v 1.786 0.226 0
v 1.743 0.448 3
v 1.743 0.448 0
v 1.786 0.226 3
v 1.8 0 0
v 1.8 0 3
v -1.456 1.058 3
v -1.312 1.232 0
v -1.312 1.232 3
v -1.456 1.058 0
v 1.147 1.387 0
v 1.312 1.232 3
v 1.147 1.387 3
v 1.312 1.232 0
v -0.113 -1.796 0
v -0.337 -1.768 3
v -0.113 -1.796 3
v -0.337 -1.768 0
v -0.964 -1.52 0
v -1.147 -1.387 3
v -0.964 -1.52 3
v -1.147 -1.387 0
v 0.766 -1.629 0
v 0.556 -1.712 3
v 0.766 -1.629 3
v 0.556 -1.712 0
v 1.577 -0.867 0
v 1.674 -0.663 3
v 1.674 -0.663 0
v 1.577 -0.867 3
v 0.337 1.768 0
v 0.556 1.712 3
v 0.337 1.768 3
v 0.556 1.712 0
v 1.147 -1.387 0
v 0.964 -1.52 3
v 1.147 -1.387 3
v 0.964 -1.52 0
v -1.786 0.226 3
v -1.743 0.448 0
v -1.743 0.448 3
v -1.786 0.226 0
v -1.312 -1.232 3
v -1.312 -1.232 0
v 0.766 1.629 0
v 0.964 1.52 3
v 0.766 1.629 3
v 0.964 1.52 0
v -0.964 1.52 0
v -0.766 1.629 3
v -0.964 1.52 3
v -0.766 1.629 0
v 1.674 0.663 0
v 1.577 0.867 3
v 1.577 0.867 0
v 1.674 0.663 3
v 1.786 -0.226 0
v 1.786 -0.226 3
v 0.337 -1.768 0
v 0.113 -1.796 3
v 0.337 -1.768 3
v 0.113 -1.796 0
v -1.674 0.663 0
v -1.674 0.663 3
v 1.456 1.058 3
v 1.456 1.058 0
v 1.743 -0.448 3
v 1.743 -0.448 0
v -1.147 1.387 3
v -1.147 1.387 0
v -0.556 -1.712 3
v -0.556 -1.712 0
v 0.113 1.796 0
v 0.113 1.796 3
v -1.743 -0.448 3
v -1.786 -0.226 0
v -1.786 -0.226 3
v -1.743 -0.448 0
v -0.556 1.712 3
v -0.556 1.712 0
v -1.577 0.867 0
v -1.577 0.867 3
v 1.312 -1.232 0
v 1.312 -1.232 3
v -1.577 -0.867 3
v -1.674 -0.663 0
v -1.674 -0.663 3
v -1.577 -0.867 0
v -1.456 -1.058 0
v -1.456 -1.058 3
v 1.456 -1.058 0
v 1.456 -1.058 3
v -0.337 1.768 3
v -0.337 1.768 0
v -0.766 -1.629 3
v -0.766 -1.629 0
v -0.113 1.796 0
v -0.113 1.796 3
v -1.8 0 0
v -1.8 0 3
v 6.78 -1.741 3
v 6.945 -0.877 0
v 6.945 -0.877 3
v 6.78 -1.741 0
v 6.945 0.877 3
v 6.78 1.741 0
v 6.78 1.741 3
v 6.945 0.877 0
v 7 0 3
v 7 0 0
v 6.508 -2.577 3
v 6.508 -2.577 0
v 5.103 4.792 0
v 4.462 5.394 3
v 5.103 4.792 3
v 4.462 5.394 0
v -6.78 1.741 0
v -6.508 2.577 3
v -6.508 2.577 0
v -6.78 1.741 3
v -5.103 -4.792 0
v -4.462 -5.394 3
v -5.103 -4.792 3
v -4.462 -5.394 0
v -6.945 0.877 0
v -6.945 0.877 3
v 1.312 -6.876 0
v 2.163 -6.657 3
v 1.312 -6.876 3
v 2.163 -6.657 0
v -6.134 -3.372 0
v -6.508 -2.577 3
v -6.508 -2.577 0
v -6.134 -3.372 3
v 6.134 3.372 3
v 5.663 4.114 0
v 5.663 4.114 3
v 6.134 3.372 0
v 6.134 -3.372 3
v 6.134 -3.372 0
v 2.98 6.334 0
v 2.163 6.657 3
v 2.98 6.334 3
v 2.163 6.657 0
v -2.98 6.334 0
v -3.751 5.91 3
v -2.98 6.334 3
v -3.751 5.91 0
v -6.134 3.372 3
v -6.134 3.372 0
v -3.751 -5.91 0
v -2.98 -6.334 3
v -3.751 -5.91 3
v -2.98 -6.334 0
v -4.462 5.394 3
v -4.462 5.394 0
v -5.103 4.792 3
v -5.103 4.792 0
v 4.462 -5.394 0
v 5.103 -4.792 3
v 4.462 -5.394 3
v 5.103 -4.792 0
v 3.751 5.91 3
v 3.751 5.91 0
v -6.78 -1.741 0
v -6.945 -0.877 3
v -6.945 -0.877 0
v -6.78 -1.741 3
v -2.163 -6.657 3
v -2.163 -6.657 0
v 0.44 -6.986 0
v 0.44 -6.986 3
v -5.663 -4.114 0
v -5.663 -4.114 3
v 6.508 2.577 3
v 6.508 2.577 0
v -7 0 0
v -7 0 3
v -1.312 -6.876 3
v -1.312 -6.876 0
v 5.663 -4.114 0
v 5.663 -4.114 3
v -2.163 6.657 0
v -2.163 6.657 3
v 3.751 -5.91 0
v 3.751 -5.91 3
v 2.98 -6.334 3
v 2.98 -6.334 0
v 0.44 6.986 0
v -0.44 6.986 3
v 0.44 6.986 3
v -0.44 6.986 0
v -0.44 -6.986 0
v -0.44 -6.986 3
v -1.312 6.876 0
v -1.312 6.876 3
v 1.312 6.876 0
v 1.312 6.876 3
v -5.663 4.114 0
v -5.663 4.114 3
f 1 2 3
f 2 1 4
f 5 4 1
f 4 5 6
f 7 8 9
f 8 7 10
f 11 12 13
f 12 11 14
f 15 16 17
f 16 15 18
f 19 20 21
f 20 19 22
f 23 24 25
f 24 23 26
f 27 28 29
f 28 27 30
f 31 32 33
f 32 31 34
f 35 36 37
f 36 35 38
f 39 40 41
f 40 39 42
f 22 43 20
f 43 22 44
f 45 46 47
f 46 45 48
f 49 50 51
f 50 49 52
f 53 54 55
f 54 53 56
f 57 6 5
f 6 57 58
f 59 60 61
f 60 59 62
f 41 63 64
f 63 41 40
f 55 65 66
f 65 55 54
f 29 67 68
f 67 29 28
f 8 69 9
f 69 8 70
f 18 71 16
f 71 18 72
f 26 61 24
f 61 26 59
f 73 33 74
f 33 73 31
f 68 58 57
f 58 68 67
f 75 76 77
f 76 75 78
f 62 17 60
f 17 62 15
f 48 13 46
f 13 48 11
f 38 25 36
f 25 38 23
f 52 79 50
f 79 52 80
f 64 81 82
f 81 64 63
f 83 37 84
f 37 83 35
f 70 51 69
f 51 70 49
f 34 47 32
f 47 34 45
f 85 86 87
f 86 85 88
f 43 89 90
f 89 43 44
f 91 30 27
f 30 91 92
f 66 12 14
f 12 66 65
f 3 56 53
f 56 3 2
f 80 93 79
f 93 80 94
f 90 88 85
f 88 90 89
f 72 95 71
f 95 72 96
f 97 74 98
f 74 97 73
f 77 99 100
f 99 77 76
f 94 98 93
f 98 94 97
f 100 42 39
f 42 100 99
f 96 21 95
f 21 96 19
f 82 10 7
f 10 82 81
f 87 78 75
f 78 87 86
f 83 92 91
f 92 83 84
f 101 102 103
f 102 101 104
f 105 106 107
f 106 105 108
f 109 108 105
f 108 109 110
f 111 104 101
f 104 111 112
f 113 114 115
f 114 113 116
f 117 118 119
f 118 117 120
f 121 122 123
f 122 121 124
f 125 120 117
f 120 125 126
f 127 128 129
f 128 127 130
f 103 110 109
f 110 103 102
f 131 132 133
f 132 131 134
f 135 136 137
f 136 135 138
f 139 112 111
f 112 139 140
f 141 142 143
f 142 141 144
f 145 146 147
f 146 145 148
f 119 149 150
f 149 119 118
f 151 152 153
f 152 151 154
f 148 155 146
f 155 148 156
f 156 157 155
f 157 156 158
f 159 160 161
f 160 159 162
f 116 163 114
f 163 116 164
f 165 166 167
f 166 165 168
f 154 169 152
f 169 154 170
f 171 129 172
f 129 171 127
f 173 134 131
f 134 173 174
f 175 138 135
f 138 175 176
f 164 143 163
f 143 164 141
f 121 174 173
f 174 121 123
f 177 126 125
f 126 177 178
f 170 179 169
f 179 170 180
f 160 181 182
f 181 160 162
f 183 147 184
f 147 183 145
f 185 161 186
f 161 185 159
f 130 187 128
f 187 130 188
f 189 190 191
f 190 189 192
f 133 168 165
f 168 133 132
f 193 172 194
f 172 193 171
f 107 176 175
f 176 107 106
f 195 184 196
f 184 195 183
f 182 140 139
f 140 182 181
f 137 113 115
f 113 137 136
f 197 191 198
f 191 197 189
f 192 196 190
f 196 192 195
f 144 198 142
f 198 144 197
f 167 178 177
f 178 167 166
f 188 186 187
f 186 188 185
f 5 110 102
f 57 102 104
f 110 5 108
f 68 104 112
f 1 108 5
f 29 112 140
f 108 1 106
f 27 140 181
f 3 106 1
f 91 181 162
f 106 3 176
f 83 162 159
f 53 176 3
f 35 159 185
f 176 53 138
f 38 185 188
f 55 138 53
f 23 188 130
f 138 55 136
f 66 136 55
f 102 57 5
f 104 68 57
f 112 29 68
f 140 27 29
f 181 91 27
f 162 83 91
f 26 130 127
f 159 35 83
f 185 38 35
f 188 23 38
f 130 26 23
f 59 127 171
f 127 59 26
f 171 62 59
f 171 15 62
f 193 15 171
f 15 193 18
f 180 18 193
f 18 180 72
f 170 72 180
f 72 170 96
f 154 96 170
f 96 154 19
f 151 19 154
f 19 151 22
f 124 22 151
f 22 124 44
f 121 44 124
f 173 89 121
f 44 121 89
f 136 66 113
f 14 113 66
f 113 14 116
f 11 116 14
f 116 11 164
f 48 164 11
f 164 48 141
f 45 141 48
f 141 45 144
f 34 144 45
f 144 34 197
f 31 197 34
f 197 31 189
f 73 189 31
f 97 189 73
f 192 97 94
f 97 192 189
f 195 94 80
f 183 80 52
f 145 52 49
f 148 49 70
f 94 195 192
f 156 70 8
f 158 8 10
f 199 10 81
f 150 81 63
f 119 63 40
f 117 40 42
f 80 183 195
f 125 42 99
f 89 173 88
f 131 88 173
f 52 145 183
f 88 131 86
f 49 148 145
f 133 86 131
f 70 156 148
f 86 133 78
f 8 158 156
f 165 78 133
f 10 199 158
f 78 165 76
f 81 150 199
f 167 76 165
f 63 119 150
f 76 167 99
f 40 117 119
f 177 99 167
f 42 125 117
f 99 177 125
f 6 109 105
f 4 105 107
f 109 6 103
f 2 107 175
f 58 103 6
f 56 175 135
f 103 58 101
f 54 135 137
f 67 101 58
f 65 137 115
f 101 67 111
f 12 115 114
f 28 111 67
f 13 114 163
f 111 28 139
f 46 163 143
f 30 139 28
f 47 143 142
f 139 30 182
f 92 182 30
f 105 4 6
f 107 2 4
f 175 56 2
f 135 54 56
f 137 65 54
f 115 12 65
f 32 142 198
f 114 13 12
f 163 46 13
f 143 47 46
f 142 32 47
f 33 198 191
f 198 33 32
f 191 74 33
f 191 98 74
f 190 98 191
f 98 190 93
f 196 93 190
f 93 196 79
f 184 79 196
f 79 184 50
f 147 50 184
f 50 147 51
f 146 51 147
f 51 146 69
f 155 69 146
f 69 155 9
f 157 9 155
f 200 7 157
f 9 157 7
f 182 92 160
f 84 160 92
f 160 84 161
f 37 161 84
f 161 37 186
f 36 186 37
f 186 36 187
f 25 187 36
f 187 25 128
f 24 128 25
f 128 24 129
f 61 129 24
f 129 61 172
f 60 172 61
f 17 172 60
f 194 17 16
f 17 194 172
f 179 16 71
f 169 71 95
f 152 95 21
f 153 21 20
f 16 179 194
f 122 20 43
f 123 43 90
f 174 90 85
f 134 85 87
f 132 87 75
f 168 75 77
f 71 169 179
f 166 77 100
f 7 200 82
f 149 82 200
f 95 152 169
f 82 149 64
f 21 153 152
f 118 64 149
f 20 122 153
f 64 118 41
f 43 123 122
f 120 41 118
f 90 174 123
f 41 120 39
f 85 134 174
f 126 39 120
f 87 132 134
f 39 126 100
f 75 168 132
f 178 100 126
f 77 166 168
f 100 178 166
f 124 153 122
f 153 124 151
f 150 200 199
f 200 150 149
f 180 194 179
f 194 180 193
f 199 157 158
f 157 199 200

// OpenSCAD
$fn = 50;


difference() {
	union() {
		cylinder(h = 3, r = 7.0000000000);
	}
	union() {
		translate(v = [0.0000000000, 0.0000000000, -100.0000000000]) {
			cylinder(h = 200, r = 1.8000000000);
		}
		cylinder(h = 3, r = 1.8000000000);
		cylinder(h = 3, r = 1.8000000000);
		cylinder(h = 3, r = 1.8000000000);
	}
}
